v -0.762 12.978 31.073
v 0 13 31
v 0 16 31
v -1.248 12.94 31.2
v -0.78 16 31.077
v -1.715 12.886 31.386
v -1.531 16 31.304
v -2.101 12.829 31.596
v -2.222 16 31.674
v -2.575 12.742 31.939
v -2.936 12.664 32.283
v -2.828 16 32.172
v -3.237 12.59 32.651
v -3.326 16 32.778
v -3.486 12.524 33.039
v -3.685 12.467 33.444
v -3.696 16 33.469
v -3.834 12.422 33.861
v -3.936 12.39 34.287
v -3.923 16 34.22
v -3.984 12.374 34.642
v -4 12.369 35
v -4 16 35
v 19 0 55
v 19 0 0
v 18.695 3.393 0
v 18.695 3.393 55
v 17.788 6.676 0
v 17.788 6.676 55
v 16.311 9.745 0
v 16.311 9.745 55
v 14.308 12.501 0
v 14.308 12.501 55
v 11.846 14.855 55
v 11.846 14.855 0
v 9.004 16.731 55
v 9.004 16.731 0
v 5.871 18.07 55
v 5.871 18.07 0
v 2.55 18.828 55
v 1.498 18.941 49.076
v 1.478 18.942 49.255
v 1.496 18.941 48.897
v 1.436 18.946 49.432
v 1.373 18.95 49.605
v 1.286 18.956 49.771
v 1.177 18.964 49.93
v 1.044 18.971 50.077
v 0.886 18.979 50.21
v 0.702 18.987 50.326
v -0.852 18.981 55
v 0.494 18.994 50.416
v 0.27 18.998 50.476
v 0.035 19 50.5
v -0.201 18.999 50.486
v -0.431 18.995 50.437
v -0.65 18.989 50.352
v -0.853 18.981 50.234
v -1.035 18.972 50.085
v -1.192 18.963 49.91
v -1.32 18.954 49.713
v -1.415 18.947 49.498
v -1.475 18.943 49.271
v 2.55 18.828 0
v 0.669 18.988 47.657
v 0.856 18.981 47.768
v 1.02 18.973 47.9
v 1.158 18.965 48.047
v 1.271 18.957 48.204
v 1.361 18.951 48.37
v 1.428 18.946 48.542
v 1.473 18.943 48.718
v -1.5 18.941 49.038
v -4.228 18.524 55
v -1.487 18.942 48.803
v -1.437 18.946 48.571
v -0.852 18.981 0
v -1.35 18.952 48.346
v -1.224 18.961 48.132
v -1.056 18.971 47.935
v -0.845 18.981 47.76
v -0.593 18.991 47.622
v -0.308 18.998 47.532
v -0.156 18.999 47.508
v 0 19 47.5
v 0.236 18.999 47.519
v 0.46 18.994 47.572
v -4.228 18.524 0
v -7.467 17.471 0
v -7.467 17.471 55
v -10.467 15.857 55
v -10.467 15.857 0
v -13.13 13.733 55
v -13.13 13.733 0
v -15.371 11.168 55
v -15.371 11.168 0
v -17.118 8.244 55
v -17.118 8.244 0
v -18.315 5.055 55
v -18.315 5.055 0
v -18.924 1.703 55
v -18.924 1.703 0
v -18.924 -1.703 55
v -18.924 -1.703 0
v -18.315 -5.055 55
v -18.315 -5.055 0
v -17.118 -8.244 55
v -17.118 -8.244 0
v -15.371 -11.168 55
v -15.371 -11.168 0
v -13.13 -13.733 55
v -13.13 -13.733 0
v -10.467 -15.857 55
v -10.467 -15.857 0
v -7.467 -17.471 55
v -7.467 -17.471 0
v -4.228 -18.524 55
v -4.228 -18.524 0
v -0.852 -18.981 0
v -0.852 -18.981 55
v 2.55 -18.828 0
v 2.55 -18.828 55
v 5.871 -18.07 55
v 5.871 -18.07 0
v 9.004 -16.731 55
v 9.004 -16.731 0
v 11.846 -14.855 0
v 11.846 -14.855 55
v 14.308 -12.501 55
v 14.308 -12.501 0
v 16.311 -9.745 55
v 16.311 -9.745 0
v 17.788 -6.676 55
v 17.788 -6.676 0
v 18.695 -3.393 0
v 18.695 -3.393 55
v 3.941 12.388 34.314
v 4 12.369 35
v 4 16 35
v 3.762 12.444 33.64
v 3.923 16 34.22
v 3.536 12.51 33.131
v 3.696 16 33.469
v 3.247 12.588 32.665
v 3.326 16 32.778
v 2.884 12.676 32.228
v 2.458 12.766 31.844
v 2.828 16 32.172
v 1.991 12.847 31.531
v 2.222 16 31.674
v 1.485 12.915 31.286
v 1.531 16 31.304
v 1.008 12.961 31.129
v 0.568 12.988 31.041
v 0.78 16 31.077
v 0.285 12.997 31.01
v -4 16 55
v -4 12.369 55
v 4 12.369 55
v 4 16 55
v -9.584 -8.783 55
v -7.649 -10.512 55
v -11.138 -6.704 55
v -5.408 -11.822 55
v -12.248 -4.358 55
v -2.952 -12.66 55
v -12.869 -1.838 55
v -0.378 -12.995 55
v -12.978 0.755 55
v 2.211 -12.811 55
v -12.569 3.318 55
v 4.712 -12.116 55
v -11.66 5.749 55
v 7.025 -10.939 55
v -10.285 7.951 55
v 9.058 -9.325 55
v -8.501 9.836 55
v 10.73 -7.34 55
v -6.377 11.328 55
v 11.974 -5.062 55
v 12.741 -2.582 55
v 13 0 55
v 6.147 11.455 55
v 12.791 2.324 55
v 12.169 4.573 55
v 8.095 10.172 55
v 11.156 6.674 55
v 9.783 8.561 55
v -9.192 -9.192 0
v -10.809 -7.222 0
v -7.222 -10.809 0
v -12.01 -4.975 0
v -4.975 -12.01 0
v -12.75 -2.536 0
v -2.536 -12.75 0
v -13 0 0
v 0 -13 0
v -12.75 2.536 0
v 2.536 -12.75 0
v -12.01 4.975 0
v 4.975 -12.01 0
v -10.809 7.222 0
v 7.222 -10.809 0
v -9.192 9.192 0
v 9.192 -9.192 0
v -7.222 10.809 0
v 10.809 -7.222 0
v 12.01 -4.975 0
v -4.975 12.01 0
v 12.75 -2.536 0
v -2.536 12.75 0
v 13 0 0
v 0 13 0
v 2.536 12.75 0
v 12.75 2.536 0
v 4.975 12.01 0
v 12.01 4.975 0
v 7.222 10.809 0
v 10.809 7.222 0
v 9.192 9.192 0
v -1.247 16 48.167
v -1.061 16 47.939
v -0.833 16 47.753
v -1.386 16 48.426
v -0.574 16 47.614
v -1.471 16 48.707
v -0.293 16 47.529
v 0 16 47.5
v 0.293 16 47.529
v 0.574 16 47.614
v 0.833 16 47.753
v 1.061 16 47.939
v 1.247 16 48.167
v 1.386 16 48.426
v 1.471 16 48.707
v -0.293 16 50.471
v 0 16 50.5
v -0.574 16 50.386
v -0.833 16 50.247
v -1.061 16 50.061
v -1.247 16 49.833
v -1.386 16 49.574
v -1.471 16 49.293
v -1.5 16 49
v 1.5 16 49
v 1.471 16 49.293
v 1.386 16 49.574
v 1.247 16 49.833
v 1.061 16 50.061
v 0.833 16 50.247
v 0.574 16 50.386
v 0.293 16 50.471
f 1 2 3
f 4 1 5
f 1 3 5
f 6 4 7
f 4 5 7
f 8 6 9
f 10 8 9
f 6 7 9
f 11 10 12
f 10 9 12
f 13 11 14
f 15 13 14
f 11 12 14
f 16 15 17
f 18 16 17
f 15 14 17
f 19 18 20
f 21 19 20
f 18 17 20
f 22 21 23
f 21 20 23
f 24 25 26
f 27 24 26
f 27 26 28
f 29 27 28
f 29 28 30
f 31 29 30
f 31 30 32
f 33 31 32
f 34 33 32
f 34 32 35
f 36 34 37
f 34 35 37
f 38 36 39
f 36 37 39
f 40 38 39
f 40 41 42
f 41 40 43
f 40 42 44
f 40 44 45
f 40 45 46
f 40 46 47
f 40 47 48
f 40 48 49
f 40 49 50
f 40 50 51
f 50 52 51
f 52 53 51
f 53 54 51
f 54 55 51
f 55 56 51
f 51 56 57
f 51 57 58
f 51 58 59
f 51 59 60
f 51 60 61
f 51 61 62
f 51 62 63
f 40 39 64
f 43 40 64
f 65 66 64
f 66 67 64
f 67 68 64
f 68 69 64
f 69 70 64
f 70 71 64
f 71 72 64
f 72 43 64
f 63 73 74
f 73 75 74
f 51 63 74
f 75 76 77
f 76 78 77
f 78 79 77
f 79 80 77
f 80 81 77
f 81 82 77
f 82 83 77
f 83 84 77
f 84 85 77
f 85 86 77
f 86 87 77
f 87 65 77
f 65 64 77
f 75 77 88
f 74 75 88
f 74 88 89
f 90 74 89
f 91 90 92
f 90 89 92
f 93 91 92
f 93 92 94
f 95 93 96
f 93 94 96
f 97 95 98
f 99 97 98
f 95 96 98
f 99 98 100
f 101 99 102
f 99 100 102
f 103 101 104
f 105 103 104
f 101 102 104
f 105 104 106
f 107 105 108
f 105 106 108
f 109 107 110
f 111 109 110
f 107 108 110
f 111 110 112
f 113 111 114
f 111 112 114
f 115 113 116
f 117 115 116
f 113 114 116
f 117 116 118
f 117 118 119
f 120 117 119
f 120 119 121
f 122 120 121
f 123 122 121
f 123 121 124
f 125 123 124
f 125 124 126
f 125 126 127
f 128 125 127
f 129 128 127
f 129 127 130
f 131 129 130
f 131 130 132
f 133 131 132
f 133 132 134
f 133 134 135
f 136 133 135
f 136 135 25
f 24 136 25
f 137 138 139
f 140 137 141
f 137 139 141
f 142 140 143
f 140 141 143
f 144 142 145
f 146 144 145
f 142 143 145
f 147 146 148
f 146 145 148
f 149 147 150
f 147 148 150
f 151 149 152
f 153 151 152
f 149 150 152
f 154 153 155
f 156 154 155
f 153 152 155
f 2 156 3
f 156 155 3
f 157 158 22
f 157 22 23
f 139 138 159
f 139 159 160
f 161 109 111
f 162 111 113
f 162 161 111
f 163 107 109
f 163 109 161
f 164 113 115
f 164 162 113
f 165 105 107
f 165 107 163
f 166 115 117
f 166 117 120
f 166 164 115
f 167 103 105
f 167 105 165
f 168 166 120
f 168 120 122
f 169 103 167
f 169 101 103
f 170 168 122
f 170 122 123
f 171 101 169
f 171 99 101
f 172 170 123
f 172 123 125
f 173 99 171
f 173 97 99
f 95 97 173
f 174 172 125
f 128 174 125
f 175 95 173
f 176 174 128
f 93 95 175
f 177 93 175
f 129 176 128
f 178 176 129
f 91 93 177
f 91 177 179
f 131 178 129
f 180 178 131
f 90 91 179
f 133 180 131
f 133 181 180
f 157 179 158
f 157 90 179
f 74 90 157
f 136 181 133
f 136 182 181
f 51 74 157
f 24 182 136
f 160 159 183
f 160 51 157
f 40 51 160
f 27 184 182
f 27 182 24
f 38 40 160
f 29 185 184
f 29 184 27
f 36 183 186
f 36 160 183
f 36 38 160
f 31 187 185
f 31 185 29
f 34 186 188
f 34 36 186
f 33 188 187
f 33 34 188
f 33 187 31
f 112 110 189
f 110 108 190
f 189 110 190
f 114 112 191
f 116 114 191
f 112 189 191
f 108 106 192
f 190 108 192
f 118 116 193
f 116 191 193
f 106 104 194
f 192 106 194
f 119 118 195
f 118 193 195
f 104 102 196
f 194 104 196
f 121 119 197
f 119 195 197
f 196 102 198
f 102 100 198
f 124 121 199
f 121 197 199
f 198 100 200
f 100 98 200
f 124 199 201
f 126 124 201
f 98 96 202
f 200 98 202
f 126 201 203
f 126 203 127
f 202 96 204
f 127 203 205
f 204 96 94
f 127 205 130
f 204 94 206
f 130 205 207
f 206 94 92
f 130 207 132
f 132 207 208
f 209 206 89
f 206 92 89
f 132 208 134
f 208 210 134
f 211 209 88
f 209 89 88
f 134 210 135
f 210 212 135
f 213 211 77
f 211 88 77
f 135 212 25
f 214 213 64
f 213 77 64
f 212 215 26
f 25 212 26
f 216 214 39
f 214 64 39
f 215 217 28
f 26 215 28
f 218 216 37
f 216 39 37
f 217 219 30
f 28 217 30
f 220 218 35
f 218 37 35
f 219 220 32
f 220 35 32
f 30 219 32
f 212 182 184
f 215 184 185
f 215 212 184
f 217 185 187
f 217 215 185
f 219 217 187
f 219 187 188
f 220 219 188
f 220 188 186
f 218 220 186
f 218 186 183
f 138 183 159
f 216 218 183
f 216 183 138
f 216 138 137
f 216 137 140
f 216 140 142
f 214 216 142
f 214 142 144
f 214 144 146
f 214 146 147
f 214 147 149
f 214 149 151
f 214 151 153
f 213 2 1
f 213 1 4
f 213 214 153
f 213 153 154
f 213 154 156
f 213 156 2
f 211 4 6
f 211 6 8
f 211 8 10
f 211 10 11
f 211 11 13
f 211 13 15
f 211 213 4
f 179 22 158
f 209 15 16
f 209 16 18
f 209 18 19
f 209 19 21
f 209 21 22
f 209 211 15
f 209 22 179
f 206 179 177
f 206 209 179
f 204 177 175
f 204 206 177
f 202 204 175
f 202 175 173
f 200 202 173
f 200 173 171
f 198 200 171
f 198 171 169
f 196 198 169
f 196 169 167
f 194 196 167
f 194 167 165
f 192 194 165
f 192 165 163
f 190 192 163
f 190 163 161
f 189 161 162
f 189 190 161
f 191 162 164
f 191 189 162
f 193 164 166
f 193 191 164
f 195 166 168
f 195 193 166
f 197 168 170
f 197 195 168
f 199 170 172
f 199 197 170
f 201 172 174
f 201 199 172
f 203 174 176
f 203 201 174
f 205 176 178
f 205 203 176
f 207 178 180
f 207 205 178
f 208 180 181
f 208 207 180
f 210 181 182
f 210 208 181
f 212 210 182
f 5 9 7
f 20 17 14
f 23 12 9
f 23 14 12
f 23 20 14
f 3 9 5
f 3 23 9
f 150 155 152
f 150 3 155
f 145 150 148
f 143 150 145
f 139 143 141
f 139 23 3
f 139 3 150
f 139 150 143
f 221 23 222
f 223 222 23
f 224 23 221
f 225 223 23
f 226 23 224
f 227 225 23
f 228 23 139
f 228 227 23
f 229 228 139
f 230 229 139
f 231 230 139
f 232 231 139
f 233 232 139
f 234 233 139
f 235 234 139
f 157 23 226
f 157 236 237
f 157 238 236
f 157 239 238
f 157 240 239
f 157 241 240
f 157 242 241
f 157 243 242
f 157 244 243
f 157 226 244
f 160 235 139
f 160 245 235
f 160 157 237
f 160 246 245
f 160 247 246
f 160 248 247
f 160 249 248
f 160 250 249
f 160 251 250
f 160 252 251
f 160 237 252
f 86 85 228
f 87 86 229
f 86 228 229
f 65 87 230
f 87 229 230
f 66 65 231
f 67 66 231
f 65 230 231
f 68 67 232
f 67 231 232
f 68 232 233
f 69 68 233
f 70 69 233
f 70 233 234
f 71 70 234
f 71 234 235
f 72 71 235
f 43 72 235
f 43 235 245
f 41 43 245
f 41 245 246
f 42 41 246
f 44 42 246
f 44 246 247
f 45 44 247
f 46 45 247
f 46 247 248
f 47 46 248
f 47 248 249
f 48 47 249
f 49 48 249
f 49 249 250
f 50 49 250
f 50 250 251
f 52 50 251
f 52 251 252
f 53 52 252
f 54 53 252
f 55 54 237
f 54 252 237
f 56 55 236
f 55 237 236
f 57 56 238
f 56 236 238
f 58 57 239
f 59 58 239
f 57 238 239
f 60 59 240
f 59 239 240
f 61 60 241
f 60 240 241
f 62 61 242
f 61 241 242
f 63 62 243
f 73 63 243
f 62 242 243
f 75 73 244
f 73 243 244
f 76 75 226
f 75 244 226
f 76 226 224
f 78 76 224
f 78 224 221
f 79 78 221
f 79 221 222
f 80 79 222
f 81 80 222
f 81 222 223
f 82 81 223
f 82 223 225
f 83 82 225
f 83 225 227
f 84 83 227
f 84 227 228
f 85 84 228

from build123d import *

# Parameters (mm, degrees)
SKETCH1_R           = 19
SKETCH1_R_2         = 13
BOSS_EXTRUDE1_DEPTH = 55
SKETCH2_W           = 8
SKETCH2_H           = 6
CUT_EXTRUDE3_DEPTH  = 24
FILLET5_R           = 4
FILLET6_R           = 4
SKETCH3_R           = 1.5
CUT_EXTRUDE11_DEPTH = 68.904344566


with BuildPart() as part:
    # Sketch1 → Boss-Extrude1 (new body)
    with BuildSketch(Plane.XY):
        Circle(SKETCH1_R)
        Circle(SKETCH1_R_2, mode=Mode.SUBTRACT)
    extrude(amount=BOSS_EXTRUDE1_DEPTH)

    # Sketch2 → Cut-Extrude3 (cut)
    with BuildSketch(Plane.XY.offset(55)):
        with Locations((0, 13)):
            Rectangle(SKETCH2_W, SKETCH2_H)
    extrude(amount=-CUT_EXTRUDE3_DEPTH, mode=Mode.SUBTRACT)

    # Fillet5
    fillet5_edges = [part.edges().sort_by_distance(p)[0] for p in [
        (4, 14.184658438, 31),
    ]]
    fillet(fillet5_edges, radius=FILLET5_R)

    # Fillet6
    fillet6_edges = [part.edges().sort_by_distance(p)[0] for p in [
        (-4, 14.184658438, 31),
    ]]
    fillet(fillet6_edges, radius=FILLET6_R - 0.0001)  # a hair under: the kernel refuses the full size

    # Sketch3 → Cut-Extrude11 (cut, through all)
    with BuildSketch(Plane(origin=(0, 16, 0), x_dir=(-1, 0, 0), z_dir=(0, -1, 0))):
        with Locations(Location((0, -49, 0), (0, 0, 90))):
            Circle(SKETCH3_R)
    extrude(amount=-CUT_EXTRUDE11_DEPTH, mode=Mode.SUBTRACT)


solid = part.part
